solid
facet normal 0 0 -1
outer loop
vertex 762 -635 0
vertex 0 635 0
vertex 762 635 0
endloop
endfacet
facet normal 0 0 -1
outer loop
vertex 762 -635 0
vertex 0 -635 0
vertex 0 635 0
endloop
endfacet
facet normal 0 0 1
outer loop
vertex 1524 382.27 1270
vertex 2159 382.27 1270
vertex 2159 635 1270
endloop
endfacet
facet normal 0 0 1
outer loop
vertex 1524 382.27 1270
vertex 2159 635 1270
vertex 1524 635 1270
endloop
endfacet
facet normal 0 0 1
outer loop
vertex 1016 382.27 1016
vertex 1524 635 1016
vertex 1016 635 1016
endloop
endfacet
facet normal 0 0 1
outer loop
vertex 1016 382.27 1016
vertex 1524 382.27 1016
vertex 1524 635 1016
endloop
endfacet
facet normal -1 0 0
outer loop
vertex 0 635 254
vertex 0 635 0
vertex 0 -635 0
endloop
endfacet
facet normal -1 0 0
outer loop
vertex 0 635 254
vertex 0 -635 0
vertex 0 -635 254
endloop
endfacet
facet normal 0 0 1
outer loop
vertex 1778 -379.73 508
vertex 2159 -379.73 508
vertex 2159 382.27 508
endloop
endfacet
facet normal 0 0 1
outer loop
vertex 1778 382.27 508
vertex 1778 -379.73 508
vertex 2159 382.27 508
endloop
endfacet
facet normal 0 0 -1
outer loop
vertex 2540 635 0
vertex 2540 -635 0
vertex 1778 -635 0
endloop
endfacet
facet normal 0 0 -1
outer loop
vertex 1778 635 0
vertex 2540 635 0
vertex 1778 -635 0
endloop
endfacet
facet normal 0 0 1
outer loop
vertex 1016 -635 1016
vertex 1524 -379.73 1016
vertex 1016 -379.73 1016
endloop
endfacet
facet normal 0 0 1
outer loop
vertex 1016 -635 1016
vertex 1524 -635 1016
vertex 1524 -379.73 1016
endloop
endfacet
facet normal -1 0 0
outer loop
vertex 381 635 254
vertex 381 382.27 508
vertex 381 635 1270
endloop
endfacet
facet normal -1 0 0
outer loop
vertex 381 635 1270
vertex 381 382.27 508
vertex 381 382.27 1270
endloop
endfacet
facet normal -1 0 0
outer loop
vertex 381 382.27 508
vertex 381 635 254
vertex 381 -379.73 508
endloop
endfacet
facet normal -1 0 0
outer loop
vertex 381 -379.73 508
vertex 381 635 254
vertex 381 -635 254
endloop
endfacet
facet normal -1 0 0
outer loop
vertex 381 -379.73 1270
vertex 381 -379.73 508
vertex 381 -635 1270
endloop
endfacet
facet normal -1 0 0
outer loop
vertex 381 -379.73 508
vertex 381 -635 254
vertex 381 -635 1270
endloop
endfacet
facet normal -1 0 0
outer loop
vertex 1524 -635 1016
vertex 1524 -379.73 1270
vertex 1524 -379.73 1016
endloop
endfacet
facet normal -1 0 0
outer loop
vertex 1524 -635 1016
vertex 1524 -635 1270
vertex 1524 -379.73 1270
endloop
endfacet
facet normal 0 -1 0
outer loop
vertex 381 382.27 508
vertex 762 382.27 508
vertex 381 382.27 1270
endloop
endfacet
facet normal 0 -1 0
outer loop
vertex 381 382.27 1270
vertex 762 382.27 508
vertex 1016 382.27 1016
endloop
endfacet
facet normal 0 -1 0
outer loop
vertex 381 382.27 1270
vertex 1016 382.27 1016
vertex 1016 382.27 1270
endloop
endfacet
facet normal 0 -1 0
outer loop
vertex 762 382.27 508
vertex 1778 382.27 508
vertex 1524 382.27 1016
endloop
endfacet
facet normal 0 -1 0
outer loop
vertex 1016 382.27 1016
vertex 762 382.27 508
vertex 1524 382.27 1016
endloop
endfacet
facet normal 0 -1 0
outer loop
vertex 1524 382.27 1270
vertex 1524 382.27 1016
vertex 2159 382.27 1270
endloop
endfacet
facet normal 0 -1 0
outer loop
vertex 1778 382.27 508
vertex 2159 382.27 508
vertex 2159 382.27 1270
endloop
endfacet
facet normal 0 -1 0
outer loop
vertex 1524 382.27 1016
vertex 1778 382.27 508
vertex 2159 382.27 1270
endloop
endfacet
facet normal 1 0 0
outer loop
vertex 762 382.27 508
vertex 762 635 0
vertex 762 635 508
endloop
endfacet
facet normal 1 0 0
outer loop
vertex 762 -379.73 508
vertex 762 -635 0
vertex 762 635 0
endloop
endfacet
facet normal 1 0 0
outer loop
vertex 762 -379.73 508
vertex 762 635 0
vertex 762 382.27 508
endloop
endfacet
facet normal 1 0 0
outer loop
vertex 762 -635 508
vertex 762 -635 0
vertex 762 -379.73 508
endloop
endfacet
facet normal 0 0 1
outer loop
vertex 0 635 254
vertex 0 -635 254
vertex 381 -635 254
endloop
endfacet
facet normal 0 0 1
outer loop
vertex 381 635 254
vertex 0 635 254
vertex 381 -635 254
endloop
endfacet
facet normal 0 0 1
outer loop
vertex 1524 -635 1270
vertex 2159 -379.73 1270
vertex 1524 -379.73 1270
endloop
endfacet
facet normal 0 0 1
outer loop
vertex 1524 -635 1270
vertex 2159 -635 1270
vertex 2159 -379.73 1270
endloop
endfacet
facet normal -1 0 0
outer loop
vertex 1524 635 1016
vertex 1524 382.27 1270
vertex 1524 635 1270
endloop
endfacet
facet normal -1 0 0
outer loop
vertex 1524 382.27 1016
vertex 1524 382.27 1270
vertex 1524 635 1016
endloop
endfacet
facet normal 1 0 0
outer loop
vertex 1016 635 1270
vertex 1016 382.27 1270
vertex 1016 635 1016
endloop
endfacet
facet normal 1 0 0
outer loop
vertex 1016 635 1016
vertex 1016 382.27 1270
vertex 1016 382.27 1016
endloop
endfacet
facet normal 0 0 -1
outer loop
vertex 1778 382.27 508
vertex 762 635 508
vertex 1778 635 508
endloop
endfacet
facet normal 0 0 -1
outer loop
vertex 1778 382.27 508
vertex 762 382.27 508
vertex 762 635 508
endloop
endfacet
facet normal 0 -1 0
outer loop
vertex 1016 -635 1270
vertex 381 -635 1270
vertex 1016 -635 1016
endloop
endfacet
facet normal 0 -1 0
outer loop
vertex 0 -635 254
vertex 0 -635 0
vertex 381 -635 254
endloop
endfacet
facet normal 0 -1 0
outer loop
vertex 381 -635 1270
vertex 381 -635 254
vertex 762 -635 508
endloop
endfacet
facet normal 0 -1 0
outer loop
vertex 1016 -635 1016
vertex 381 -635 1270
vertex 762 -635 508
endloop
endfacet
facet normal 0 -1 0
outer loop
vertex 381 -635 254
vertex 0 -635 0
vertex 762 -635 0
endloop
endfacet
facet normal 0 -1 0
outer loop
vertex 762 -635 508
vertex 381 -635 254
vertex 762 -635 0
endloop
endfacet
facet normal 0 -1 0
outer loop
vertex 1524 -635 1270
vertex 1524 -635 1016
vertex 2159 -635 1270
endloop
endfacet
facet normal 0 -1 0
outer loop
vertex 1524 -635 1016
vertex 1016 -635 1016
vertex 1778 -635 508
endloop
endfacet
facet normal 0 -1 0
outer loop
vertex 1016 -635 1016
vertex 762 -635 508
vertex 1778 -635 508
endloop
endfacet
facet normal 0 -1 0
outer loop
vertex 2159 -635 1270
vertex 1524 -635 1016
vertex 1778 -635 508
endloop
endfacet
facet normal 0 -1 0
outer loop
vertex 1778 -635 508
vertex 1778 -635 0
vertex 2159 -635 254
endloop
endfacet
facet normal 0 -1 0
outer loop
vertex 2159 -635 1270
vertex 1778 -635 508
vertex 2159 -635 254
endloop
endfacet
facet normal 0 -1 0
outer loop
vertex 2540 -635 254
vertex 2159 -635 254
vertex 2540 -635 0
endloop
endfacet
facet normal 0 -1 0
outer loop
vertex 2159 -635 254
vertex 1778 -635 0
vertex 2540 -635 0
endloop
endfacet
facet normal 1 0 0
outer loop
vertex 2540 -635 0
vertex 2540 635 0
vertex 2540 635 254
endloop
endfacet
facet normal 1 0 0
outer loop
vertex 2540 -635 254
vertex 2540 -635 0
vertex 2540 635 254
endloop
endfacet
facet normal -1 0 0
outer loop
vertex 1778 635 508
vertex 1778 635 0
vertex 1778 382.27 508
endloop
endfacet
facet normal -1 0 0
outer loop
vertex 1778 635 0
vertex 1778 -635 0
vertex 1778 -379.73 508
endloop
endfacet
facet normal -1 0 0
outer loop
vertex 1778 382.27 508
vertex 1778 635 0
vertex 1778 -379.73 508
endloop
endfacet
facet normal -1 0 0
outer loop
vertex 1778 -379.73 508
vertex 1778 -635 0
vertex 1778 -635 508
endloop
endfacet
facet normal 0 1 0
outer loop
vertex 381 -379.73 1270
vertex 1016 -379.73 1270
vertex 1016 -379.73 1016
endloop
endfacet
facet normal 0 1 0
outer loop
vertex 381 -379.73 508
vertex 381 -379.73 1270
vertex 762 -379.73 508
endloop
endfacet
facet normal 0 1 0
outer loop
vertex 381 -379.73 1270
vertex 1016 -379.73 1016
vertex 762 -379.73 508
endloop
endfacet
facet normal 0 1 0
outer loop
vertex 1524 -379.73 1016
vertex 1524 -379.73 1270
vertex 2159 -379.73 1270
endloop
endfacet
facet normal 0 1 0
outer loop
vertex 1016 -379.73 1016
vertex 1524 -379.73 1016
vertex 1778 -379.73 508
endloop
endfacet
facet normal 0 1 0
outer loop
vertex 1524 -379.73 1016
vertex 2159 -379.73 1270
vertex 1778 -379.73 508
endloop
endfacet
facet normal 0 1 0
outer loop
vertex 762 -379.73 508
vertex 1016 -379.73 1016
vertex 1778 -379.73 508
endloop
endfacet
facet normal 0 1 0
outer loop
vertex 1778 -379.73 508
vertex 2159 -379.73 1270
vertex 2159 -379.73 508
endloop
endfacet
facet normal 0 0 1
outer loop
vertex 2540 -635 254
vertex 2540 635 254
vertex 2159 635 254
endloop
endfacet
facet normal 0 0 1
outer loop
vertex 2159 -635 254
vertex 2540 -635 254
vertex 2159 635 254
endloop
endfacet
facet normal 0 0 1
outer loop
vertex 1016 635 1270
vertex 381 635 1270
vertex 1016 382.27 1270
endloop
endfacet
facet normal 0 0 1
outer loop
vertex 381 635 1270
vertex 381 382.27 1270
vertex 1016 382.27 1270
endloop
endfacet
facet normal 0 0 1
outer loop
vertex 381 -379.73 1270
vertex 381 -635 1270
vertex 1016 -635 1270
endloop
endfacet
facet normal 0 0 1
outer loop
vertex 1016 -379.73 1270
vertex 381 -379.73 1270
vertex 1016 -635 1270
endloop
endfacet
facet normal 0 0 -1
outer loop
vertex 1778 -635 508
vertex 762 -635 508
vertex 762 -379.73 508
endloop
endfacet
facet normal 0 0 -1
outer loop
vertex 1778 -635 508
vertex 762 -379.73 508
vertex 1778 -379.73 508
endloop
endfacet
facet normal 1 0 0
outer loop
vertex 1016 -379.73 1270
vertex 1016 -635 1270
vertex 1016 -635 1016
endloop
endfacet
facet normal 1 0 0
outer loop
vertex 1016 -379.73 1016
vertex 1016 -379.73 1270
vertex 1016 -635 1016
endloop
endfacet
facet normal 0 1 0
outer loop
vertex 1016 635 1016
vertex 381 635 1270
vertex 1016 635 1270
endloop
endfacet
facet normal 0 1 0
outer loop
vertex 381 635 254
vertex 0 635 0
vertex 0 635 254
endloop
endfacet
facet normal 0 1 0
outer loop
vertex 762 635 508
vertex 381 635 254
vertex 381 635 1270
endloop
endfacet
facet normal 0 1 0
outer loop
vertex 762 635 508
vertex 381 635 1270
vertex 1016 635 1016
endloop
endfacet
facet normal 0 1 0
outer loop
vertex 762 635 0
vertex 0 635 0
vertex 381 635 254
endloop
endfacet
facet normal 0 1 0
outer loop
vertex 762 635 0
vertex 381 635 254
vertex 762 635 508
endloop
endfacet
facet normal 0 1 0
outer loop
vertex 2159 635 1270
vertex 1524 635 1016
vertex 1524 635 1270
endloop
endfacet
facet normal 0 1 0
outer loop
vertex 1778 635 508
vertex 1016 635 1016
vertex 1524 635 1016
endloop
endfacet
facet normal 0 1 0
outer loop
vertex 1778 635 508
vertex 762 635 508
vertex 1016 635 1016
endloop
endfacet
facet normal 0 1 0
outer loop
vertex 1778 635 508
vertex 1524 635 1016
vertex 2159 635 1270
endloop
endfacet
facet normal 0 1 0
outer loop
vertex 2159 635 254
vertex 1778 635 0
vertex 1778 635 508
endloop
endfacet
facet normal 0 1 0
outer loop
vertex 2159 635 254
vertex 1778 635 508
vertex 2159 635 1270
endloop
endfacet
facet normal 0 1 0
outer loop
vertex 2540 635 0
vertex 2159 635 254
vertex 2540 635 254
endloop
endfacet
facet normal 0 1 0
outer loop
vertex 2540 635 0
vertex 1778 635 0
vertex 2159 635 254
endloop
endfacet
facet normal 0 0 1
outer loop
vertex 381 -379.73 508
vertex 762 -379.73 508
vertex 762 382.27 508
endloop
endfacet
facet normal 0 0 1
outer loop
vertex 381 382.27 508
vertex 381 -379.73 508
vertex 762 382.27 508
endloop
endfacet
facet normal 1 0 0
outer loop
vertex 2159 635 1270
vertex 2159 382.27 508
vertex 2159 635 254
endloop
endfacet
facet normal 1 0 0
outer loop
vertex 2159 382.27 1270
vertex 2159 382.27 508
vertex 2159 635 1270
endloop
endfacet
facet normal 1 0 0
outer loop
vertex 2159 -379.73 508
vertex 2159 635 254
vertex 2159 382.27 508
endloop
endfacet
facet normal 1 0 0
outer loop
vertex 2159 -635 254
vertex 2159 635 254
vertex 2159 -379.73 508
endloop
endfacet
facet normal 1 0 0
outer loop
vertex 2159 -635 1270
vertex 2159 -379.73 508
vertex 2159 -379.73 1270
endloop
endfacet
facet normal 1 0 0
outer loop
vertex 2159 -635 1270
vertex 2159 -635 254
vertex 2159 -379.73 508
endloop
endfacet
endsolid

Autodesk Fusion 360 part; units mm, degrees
sketch "Sketch1" plane through (0, 0, 0) normal (0, 1, 0) x (1, 0, 0)
  line L0 (0, 0) -> (762, 0)
  line L1 (762, 0) -> (762, -508)
  line L2 (0, 0) -> (0, -254)
  line L3 (0, -254) -> (381, -254)
  line L4 (381, -254) -> (381, -1270)
  line L5 (762, -508) -> (1270, -508)
  line L6 (381, -1270) -> (1016, -1270)
  line L7 (1016, -1270) -> (1016, -1016)
  line L8 (1016, -1016) -> (1270, -1016)
  line L9 (1524, -1016) -> (1270, -1016)
  line L10 (2159, -1270) -> (1524, -1270)
  line L11 (1524, -1270) -> (1524, -1016)
  line L12 (2159, -254) -> (2159, -1270)
  line L13 (2540, -254) -> (2159, -254)
  line L14 (2540, 0) -> (2540, -254)
  line L15 (2540, 0) -> (1778, 0)
  line L16 (1778, 0) -> (1778, -508)
  line L17 (1778, -508) -> (1270, -508)
extrude "Extrude1" add sketch "Sketch1" along normal mid plane 1270
sketch "Sketch2" plane through (0, 0, 254) normal (0, 0, 1) x (-1, 0, 0)
  line L0 (-381, 635) -> (-381, -635)
  line L1 (-381, -635) -> (0, -635)
  line L2 (0, 635) -> (-381, 635)
sketch "Sketch3" plane through (2159, 0, 0) normal (1, 0, 0) x (0, 1, 0)
  line L0 (-635, 254) -> (635, 254)
  line L1 (635, 254) -> (635, 1270)
  line L2 (635, 1270) -> (-635, 1270)
  line L3 (-635, 1270) -> (-635, 254)
  line L4 (-635, 508) -> (635, 508)
  line L5 (-379.7297, 1270) -> (-379.7297, 508)
  line L6 (382.2703, 508) -> (382.2703, 1270)
  line L7 (-379.7297, 1270) -> (382.2703, 1270)
  dimension "d9" = 762
extrude "Extrude2" cut sketch "Sketch3" against normal blind 1778 contours L2 L4 L5 L6 L7
